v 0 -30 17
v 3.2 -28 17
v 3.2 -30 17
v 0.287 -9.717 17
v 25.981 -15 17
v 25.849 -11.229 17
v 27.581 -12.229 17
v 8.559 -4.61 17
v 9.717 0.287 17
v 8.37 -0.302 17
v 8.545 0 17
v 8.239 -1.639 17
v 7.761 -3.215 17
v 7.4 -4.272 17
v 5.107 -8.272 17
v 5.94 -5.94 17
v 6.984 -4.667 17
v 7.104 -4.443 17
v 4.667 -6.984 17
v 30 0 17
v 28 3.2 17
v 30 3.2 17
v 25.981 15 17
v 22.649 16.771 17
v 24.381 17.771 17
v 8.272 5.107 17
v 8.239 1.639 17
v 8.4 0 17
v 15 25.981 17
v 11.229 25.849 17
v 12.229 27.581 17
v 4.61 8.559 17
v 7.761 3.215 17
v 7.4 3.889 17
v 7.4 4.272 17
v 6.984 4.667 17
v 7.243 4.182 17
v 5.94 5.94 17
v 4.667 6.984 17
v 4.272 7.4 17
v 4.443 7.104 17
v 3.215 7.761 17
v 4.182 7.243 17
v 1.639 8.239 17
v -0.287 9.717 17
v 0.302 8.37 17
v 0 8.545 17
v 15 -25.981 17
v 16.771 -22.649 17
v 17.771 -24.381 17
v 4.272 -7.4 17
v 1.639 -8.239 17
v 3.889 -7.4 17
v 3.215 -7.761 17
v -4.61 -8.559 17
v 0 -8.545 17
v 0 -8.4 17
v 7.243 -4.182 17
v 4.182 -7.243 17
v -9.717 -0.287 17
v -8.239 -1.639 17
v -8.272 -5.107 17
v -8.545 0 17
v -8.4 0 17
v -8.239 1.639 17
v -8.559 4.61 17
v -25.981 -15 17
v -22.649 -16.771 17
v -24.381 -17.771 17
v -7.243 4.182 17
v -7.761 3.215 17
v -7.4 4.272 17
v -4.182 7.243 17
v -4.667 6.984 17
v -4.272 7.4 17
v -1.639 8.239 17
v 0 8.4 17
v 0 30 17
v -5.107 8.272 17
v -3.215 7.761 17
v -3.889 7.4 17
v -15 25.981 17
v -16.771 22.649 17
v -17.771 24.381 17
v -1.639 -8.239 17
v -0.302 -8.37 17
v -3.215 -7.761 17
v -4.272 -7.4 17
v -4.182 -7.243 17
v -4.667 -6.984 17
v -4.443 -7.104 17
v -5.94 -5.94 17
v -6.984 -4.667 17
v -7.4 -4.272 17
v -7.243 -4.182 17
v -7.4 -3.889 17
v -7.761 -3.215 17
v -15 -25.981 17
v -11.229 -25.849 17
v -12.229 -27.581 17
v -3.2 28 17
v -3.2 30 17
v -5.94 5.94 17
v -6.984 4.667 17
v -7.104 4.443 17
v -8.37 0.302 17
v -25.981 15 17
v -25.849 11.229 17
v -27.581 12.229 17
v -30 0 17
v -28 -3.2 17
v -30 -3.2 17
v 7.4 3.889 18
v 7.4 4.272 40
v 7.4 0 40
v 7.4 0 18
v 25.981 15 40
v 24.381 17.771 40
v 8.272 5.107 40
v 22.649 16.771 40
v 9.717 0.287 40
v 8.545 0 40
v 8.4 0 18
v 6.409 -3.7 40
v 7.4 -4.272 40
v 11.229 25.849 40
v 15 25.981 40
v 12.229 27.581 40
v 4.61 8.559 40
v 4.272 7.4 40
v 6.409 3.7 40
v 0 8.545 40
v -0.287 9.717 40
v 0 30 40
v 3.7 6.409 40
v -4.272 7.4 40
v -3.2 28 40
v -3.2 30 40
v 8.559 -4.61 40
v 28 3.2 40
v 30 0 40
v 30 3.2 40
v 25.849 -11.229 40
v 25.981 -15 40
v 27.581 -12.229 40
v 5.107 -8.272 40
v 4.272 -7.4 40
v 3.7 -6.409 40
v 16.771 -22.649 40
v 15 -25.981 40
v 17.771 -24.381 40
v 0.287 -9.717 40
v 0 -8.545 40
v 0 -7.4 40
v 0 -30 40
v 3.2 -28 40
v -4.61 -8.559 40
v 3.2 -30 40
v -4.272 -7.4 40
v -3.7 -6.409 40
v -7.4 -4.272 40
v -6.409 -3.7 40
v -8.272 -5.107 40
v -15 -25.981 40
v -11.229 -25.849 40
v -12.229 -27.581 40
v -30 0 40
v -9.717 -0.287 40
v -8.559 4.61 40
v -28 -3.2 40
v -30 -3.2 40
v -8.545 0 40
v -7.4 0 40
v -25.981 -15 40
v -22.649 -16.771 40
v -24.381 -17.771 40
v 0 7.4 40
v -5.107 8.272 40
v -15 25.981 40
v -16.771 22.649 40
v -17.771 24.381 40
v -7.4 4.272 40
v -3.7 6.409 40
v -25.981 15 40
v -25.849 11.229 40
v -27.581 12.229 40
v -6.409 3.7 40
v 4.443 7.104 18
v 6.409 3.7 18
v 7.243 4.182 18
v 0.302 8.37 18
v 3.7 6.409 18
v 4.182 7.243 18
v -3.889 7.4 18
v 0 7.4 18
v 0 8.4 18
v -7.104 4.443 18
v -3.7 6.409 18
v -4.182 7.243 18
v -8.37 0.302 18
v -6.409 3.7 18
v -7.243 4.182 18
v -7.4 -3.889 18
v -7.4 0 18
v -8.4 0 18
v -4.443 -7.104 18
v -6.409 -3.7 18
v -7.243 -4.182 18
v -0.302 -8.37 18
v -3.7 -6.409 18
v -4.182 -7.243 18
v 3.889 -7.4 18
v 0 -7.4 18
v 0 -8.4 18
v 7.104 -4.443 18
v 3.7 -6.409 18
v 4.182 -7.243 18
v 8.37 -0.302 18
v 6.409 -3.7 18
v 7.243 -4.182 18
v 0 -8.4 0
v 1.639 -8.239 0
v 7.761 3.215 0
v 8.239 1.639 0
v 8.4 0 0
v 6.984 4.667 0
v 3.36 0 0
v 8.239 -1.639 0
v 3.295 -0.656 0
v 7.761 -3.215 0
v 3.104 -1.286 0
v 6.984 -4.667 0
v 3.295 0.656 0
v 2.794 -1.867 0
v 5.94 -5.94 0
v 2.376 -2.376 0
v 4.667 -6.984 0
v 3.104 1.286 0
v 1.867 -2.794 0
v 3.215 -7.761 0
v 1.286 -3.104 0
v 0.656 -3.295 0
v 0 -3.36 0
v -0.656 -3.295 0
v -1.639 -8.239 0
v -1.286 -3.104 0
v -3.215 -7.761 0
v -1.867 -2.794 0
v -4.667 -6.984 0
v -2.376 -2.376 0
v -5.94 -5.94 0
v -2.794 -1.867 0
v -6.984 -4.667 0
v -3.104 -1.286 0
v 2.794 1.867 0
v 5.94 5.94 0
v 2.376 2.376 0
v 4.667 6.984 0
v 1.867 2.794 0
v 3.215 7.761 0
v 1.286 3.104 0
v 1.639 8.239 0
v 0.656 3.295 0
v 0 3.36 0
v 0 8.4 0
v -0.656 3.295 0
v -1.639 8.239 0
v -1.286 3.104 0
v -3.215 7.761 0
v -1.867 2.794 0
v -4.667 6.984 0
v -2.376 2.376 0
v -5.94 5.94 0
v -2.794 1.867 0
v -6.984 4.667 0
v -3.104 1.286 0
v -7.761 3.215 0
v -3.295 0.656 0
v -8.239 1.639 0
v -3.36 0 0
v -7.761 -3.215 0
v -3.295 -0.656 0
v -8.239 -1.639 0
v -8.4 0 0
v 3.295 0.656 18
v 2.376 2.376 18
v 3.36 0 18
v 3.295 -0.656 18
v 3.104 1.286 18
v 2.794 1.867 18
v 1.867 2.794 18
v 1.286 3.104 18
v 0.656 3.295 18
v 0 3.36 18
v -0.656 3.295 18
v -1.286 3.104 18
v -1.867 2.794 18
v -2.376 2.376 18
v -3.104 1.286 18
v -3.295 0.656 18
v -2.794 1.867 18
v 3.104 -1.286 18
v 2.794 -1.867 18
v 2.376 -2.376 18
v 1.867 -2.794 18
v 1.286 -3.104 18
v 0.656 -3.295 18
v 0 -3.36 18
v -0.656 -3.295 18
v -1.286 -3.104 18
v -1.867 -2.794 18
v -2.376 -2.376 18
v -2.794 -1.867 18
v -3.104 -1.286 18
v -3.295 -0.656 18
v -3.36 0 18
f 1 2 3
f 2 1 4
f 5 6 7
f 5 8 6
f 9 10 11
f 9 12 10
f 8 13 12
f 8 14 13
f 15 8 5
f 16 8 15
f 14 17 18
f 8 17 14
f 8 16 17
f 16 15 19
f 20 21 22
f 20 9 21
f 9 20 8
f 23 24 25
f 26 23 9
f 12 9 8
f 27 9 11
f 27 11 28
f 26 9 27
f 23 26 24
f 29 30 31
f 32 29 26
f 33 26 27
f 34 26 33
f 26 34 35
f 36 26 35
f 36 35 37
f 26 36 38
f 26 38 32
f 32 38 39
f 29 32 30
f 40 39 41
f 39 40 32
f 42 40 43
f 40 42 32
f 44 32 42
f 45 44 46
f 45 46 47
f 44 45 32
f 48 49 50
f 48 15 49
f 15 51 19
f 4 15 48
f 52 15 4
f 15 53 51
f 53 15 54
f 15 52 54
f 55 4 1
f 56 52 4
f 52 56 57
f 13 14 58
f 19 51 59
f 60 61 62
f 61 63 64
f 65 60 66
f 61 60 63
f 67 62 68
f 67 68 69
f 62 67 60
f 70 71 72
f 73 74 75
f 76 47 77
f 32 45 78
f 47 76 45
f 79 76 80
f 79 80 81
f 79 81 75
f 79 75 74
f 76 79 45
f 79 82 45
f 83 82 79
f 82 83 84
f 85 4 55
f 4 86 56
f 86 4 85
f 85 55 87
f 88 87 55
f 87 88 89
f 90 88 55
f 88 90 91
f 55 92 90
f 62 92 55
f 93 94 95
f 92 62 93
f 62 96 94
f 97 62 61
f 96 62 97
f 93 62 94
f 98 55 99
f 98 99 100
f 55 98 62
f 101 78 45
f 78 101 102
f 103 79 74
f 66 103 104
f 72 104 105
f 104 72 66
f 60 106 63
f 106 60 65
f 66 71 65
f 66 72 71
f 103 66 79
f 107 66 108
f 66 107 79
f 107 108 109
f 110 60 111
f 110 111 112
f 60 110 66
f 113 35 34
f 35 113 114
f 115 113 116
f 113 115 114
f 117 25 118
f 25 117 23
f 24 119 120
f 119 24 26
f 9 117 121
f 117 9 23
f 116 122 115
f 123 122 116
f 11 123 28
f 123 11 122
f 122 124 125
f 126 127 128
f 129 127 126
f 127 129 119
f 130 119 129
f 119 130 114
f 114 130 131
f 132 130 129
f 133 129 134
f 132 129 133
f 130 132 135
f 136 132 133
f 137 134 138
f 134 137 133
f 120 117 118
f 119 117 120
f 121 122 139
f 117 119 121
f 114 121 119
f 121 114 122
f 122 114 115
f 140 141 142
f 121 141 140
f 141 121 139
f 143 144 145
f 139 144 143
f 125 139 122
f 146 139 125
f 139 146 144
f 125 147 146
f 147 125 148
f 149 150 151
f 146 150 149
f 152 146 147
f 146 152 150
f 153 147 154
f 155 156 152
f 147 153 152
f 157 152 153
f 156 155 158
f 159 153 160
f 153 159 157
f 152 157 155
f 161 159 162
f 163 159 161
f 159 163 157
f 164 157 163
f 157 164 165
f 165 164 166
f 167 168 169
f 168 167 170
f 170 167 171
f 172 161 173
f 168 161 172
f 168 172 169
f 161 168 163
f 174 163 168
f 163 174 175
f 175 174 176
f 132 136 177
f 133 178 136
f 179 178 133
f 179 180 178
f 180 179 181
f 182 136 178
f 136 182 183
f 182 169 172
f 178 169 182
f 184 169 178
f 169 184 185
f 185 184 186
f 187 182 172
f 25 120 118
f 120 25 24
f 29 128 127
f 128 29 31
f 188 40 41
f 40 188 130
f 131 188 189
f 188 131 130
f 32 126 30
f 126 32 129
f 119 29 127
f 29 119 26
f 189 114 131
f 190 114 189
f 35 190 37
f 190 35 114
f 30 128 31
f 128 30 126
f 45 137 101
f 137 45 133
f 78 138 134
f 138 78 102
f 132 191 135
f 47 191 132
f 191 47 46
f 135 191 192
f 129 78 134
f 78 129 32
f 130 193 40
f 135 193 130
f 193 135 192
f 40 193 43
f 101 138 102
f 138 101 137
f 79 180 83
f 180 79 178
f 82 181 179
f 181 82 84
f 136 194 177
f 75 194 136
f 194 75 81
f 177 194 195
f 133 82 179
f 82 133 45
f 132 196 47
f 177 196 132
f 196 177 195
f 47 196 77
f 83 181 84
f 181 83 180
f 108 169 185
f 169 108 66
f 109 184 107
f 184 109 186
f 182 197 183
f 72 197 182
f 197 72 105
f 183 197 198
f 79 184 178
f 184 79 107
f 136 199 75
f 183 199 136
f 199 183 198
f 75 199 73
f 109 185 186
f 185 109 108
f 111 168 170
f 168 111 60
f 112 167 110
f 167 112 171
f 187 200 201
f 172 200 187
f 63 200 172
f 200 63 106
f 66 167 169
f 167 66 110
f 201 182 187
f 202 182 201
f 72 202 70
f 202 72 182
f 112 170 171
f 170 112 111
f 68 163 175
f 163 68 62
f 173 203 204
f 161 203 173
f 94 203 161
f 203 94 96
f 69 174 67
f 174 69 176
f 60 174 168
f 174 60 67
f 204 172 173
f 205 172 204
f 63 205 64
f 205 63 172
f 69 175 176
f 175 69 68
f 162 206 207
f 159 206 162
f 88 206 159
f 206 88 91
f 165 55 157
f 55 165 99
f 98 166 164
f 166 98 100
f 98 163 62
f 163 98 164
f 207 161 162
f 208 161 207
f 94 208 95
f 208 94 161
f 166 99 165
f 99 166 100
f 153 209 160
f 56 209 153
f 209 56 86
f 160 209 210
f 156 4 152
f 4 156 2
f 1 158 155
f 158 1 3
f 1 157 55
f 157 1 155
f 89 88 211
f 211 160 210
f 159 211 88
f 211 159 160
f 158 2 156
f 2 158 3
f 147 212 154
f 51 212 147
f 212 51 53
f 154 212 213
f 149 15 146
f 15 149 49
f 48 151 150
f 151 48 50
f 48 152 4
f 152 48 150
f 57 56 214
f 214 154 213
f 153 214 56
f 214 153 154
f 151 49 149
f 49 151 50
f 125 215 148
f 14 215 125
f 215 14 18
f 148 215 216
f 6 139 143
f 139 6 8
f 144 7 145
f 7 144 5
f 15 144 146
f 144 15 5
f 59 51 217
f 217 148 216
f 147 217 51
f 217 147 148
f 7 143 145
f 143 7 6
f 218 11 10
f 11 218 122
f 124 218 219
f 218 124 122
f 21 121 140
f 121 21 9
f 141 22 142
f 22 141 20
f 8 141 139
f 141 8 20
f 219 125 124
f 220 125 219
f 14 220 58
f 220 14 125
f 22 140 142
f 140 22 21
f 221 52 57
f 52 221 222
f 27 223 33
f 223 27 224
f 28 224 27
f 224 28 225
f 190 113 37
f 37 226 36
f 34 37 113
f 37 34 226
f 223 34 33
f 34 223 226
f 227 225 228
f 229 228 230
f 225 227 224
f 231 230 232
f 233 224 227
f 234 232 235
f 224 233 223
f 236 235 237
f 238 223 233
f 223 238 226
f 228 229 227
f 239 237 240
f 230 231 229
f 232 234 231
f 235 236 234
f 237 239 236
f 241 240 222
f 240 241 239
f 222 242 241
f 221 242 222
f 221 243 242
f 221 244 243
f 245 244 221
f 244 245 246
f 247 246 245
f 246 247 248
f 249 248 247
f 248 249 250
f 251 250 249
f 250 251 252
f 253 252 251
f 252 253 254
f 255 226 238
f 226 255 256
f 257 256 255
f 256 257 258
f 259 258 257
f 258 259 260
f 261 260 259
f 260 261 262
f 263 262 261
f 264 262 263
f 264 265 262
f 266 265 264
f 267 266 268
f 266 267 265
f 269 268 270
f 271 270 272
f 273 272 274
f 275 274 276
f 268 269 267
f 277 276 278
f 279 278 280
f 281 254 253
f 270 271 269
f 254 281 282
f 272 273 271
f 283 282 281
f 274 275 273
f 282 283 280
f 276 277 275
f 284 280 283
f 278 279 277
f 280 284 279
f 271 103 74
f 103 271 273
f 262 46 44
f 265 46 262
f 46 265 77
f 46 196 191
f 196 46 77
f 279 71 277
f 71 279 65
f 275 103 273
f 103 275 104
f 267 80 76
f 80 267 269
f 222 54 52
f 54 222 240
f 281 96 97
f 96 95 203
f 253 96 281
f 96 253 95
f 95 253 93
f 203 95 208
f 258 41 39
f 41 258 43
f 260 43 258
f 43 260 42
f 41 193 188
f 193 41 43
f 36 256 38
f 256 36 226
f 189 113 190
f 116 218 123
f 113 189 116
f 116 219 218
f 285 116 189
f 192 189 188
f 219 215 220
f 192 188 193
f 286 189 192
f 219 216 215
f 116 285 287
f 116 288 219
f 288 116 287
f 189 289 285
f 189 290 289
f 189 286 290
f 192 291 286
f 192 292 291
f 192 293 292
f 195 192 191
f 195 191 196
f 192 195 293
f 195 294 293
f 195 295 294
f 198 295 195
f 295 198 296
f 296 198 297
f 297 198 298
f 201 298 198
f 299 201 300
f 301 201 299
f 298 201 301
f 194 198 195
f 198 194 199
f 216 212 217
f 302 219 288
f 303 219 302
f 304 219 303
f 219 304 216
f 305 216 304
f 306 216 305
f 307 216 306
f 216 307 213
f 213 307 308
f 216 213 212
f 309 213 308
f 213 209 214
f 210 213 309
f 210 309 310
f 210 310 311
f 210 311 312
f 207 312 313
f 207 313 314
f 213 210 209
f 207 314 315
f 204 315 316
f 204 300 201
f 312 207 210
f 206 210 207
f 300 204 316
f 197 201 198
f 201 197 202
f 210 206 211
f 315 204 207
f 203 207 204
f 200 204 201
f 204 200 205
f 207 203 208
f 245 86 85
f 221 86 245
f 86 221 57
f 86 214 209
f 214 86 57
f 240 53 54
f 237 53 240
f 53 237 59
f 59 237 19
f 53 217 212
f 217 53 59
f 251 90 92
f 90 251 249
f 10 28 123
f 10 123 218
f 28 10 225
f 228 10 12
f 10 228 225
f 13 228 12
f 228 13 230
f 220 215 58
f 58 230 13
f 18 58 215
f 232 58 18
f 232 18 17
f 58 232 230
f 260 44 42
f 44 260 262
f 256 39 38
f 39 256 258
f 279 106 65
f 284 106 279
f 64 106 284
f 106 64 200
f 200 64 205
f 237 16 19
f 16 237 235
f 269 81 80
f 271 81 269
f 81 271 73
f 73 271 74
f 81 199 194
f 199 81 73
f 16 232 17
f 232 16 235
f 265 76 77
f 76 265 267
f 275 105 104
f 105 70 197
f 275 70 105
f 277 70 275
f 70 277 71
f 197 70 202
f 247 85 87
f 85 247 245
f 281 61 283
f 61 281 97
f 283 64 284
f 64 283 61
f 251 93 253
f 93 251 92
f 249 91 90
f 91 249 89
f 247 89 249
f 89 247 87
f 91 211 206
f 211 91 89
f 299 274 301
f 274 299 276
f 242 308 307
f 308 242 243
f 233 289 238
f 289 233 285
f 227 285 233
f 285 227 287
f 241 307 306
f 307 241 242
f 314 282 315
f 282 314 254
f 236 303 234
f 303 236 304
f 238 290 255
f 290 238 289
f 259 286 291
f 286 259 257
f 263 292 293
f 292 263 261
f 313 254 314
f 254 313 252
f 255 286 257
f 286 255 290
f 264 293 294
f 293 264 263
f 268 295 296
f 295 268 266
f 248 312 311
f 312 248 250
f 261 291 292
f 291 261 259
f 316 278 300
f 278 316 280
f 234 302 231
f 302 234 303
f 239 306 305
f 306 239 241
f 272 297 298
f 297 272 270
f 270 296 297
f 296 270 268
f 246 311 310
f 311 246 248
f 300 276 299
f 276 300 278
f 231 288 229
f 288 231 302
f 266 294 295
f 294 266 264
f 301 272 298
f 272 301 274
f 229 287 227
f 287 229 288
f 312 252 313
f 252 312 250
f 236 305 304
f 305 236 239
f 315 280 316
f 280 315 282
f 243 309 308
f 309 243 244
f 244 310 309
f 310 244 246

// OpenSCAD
$fn = 32;

// ----------------------------------------------------------------------
// Impeller: 60 mm, 12 blades, 40 mm tall
// ----------------------------------------------------------------------

// --- parameters (mm) ---
center_d = 16.8;          // hub diameter
center_h = 18;            // hub height
wheel_d = 60;             // outer diameter over the blades
blade_count = 12;         // number of blades
blade_t = 2;              // blade thickness
blade_h = 22;             // blade height
blade_in_r = 7.4;         // blade root radius
blade_out_r = 28;         // blade tip radius
sweep = 30;               // blade sweep, degrees
bore_d = 6.72;            // shaft bore

module hub() {
  cylinder(h = center_h, d = center_d);
}

module blade() {
  /* blade swept between two boxes: hull of the root and the tip section */
  hull() {
    translate([blade_in_r, 0, center_h - 1])
      cube([blade_t, blade_t * 2.2, blade_h + 1], center = false);
    rotate([0, 0, sweep])
      translate([blade_out_r, 0, center_h - 1])
        cube([blade_t, blade_t * 1.6, blade_h + 1], center = false);
  }
}

module blades() {
  for (i = [0 : blade_count - 1])
    rotate([0, 0, i * 360 / blade_count]) blade();
}

difference() {
  union() {
    hub();
    blades();
  }
  translate([0, 0, -1]) cylinder(h = center_h + blade_h + 0 + 3, d = bore_d);
}
